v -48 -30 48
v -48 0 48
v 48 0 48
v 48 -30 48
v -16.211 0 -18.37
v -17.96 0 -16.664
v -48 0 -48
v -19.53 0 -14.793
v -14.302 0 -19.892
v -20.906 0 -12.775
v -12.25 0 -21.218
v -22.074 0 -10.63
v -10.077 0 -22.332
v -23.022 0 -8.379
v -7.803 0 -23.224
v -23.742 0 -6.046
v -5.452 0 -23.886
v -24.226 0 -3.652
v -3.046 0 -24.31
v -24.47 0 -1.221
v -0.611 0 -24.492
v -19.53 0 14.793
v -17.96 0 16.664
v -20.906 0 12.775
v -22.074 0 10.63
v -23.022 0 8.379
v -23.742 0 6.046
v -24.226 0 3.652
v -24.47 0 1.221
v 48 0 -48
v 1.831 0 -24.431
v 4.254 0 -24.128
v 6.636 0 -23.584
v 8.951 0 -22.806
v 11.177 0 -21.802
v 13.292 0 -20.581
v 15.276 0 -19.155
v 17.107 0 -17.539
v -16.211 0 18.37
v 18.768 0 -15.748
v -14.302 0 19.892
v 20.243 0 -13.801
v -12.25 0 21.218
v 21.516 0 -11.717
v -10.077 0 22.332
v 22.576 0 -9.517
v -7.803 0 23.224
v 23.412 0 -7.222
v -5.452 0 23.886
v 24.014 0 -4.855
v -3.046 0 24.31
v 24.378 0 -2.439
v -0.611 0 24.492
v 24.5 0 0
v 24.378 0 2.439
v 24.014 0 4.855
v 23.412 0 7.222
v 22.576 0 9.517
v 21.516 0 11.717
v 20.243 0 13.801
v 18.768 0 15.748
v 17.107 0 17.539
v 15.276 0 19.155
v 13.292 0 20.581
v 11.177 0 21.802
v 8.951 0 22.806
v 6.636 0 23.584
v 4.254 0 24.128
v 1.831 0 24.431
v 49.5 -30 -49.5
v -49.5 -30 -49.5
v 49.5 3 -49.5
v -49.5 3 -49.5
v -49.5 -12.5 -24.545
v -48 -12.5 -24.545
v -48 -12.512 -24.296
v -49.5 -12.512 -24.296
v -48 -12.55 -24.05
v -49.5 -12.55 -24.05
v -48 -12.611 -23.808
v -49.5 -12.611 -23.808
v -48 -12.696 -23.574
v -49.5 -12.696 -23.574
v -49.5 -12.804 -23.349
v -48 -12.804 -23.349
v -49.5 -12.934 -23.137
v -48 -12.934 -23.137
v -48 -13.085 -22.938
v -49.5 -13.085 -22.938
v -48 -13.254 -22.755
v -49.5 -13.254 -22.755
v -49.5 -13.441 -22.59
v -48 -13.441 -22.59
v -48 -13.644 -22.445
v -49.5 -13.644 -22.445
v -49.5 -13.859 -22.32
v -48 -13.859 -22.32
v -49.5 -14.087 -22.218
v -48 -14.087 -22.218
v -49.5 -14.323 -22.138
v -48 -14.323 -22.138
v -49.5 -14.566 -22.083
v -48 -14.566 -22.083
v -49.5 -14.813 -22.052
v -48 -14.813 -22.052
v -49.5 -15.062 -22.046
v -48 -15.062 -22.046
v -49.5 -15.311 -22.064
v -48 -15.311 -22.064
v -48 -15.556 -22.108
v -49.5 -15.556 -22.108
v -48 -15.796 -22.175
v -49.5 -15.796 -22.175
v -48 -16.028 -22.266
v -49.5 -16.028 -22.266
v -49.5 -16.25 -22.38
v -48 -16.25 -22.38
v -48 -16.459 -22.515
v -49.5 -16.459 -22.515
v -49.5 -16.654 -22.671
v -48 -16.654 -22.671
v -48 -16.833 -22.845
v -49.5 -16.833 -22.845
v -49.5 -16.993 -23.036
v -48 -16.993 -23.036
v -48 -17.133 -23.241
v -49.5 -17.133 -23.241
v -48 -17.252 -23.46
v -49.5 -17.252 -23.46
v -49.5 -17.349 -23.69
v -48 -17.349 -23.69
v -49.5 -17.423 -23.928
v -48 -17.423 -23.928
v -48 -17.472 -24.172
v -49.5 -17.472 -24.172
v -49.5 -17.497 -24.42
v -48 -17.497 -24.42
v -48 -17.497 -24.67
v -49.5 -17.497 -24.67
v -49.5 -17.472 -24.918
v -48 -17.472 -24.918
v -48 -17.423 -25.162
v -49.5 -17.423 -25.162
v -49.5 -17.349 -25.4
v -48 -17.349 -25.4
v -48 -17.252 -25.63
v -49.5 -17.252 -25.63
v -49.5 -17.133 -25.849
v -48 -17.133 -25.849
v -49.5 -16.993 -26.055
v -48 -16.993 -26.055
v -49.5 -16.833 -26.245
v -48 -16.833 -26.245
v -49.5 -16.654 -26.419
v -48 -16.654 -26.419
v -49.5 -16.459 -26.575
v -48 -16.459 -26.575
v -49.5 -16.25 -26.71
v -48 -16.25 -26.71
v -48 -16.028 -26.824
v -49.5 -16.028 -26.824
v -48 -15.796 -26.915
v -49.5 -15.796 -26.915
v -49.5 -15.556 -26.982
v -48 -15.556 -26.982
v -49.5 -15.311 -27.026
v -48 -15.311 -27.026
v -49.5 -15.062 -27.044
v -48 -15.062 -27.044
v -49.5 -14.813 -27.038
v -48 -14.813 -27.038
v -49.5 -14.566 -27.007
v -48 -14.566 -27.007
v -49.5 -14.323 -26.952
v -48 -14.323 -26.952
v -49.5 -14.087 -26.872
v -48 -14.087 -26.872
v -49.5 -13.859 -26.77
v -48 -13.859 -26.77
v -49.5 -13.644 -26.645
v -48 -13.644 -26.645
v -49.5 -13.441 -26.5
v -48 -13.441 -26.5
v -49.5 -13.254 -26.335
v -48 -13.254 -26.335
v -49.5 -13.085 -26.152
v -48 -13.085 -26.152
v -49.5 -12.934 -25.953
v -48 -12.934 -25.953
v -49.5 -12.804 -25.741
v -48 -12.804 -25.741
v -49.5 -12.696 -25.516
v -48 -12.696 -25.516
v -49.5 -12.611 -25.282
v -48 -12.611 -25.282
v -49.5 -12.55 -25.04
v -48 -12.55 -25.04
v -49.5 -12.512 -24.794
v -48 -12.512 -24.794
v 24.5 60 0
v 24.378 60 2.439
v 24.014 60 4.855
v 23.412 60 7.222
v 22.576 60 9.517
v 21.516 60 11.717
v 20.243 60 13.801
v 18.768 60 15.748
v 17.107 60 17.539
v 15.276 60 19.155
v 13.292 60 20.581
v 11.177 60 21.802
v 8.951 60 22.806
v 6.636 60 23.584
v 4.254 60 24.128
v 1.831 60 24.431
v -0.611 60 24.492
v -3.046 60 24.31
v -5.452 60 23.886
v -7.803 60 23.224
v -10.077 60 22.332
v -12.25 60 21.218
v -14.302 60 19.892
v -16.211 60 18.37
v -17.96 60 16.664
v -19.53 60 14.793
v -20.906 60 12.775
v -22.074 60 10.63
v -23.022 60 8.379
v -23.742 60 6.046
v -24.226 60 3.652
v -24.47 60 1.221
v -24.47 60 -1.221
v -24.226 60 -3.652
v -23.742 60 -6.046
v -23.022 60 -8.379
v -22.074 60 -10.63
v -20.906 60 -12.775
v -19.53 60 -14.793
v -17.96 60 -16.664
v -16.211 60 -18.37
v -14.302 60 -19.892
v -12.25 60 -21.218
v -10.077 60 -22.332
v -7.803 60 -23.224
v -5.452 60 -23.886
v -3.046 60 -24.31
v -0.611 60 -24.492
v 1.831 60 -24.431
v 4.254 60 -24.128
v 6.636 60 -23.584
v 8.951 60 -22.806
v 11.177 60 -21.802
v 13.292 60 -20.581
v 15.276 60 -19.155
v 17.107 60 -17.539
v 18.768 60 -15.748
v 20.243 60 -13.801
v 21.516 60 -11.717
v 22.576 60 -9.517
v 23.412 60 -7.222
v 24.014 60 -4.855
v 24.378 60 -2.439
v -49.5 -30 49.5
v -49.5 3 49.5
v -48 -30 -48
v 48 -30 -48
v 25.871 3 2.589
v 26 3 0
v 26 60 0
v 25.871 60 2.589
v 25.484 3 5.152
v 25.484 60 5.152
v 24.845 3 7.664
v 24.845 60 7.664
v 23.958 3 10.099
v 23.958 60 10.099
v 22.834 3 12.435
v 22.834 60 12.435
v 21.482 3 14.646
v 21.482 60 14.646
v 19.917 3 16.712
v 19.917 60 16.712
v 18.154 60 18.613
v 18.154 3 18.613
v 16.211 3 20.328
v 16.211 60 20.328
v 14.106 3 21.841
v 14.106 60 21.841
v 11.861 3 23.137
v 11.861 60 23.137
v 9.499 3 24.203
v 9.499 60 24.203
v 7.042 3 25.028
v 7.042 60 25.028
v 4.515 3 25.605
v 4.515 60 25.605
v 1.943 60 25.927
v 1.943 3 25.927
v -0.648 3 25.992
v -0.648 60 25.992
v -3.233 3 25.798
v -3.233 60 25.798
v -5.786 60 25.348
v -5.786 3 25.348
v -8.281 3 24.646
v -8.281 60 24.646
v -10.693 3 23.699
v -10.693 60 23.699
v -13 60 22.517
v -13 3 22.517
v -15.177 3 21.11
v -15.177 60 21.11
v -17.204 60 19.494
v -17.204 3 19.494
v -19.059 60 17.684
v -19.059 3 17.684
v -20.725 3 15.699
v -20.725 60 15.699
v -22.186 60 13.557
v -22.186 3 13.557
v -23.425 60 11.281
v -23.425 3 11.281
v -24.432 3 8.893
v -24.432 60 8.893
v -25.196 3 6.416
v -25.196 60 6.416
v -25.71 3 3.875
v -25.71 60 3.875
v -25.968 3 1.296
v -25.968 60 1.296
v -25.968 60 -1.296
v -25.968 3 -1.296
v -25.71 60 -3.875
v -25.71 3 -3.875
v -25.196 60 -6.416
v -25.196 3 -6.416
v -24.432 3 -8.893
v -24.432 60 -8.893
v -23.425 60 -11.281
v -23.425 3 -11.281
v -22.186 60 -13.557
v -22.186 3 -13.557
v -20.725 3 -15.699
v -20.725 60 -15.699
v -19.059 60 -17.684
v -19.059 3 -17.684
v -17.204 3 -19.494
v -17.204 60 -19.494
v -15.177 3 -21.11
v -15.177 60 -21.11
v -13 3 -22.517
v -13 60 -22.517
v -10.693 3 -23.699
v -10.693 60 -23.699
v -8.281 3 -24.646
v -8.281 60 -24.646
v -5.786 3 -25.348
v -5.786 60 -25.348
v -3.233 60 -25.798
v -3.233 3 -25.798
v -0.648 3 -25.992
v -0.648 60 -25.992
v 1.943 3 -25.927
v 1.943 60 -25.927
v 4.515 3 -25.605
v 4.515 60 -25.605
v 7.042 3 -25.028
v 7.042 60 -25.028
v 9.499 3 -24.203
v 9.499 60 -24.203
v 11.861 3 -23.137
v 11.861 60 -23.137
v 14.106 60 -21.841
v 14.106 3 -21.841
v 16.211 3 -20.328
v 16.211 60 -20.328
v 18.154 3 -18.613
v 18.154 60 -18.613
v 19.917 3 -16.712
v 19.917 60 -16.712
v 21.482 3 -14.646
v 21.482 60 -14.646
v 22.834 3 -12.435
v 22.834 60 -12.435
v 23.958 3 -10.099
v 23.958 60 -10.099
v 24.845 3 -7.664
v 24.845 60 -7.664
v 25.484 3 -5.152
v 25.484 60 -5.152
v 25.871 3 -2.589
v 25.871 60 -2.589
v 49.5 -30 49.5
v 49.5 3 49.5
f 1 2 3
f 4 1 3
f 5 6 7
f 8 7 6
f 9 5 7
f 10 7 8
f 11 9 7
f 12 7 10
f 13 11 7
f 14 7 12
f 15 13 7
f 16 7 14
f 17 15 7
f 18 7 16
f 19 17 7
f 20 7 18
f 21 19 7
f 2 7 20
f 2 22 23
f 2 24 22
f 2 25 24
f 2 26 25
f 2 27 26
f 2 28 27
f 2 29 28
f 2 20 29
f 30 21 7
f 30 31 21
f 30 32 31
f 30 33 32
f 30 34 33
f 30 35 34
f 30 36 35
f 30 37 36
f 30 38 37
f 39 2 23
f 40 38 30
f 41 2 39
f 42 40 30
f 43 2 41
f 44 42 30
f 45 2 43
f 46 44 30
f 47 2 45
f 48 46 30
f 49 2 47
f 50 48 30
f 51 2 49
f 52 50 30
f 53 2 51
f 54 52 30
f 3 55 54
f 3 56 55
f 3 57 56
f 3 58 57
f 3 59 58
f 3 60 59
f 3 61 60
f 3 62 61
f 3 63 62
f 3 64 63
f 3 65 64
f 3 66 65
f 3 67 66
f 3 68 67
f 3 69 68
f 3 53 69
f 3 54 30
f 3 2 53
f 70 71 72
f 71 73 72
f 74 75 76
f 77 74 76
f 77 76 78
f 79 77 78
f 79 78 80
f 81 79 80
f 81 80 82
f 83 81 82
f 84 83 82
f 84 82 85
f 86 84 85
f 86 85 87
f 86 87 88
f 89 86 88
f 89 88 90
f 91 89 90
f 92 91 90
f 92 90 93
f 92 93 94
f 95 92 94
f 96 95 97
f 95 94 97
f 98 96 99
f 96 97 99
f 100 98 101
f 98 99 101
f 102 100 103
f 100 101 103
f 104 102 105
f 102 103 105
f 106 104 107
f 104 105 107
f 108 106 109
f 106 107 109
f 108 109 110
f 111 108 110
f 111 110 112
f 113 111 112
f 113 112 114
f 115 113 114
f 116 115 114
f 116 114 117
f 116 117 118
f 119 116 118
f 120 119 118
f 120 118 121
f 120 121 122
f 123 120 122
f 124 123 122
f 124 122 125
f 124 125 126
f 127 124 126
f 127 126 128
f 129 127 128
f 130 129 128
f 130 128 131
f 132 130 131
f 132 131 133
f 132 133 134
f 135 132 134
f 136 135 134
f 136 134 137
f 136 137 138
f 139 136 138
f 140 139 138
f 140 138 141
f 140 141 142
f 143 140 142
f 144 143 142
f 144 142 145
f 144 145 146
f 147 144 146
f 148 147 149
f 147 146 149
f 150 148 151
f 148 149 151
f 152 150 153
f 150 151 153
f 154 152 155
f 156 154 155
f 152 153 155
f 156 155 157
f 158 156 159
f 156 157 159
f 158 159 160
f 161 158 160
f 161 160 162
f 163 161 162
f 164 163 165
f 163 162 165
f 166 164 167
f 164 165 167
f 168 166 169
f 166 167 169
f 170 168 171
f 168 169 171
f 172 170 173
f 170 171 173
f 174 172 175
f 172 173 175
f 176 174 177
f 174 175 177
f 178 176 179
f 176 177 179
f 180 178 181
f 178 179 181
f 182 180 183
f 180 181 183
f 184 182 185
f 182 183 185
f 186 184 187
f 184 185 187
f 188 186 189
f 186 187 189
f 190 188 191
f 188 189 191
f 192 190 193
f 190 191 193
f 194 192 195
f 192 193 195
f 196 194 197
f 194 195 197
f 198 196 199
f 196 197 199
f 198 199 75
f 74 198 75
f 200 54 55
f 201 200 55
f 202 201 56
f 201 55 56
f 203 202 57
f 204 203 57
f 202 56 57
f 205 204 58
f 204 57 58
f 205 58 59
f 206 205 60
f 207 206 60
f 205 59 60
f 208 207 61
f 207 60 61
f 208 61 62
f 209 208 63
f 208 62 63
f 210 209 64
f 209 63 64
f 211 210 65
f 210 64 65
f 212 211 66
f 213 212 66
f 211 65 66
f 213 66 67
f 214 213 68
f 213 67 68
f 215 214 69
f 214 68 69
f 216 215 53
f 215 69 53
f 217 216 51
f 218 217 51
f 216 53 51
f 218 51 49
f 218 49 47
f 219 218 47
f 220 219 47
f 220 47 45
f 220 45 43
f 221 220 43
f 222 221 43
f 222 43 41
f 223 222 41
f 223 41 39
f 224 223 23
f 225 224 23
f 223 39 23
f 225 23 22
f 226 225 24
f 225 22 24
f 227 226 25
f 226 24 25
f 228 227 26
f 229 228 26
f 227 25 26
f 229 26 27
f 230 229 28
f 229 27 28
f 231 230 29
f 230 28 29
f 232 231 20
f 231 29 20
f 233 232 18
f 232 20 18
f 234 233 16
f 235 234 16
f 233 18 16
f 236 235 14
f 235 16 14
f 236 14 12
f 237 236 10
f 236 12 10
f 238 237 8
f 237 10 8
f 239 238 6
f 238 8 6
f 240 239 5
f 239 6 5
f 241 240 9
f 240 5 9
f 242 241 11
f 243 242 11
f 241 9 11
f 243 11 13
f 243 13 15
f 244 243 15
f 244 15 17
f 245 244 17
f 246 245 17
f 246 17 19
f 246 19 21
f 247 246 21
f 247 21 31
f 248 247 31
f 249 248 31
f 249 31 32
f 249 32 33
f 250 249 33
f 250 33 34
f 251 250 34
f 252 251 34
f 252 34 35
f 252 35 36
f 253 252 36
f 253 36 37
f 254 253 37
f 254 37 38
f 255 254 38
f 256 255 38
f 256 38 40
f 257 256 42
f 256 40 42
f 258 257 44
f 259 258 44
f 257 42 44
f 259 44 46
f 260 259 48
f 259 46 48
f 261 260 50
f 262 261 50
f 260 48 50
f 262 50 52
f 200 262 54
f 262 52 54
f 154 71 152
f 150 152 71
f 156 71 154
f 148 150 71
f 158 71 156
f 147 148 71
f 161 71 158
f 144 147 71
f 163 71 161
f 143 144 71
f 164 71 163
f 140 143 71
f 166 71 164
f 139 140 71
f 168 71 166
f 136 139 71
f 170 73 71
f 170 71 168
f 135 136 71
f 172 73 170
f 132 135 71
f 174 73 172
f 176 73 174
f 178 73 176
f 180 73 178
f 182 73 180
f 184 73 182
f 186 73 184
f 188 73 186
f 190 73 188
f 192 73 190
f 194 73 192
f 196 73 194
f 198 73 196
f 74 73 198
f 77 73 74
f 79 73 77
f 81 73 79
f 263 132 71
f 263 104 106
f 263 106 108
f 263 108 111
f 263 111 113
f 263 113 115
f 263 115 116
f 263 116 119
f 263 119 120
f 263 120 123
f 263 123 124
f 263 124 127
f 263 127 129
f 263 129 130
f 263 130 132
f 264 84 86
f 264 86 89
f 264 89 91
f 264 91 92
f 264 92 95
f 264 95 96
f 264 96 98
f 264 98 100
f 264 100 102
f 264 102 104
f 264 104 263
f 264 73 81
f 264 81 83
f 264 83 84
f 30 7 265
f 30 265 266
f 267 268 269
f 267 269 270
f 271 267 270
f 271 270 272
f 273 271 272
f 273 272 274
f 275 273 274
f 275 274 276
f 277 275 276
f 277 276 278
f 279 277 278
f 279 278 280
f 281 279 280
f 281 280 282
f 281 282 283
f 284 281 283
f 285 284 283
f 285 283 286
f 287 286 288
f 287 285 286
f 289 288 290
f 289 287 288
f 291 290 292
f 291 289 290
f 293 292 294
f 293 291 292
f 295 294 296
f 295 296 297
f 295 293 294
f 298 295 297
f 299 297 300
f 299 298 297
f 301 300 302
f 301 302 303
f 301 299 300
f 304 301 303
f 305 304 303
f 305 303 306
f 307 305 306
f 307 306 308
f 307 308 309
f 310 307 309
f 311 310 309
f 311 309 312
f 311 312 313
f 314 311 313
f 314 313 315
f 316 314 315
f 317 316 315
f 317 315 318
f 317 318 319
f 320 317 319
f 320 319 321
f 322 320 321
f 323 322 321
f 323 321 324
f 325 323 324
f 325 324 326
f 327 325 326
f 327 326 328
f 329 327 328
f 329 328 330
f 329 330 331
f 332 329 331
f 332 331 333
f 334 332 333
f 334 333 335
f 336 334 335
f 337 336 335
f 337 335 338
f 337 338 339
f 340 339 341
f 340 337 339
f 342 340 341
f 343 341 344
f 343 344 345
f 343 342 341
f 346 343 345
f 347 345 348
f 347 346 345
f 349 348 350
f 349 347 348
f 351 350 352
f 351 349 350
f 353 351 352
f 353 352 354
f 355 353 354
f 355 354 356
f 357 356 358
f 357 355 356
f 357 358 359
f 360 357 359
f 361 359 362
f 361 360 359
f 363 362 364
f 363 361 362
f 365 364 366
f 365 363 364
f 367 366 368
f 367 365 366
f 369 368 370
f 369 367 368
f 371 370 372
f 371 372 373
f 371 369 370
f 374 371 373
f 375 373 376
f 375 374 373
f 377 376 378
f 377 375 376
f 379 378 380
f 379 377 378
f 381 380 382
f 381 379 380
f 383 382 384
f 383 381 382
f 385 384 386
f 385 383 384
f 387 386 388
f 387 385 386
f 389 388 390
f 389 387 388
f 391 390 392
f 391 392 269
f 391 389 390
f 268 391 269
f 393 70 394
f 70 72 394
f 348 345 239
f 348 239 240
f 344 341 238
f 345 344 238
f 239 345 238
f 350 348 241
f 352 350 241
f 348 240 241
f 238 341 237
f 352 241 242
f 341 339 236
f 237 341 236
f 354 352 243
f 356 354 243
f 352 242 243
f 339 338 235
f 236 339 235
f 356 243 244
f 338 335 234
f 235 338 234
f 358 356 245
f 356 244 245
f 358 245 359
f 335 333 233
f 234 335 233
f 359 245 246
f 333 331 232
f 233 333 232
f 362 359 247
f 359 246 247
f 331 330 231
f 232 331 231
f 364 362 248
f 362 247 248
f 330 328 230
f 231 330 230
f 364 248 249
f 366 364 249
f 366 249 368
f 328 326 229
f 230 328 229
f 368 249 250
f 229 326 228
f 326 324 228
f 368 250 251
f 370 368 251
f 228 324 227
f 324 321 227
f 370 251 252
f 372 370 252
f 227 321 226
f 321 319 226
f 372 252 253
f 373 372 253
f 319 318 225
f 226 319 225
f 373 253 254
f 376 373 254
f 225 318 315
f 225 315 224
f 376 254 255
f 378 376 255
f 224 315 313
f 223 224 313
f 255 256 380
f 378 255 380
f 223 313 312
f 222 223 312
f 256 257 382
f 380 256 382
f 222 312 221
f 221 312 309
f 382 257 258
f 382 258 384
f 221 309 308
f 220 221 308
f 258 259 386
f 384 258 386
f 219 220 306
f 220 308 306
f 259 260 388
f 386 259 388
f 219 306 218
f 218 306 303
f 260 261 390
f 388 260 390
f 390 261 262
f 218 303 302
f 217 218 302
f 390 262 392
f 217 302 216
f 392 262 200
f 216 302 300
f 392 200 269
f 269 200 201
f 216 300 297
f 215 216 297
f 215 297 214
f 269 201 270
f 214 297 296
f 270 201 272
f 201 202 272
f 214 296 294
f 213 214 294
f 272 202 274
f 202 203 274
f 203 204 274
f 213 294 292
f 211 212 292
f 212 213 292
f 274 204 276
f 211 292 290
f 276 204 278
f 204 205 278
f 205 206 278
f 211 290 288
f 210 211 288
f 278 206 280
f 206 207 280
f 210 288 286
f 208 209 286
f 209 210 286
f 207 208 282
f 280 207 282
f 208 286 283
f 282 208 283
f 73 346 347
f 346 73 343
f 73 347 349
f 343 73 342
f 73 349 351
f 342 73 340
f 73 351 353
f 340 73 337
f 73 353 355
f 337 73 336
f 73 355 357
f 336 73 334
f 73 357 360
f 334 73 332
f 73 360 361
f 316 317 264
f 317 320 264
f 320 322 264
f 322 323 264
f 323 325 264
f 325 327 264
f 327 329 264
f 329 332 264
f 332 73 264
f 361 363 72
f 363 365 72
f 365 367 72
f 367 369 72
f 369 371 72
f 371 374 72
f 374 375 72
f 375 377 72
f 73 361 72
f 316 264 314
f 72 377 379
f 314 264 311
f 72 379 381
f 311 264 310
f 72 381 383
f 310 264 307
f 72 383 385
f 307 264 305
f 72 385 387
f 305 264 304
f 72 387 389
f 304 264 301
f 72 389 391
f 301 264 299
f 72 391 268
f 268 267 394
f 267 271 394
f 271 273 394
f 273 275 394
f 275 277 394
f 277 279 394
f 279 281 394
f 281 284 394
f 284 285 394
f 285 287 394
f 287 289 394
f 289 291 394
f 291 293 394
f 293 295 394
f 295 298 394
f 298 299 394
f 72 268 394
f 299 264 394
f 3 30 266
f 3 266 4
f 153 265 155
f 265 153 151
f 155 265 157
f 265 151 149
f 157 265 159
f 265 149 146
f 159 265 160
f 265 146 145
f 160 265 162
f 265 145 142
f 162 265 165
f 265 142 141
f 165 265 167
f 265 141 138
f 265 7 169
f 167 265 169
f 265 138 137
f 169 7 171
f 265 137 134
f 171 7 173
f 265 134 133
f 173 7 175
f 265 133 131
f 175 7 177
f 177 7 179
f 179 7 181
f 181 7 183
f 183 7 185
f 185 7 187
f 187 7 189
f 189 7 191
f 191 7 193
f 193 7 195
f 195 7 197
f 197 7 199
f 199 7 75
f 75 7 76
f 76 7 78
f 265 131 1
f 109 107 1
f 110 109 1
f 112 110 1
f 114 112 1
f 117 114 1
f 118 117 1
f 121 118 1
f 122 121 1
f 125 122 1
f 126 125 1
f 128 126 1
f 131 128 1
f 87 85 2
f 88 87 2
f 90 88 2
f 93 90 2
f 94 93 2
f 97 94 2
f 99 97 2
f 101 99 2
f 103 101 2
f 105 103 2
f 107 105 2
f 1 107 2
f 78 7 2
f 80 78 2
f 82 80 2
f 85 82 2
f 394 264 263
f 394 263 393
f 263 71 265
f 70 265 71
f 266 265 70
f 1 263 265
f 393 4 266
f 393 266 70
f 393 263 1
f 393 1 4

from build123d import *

# Parameters (mm, degrees)
F0_W     = 99
F0_H     = 99
F1_DEPTH = 3
F2_R     = 26
F2_R_2   = 23
F3_DEPTH = 4
F4_R     = 26
F4_R_2   = 24.5
F5_DEPTH = 60
F6_W     = 99
F6_H     = 99
F6_W_2   = 96
F6_H_2   = 96
F7_DEPTH = 30
F8_R     = 2.5
F9_DEPTH = 25


with BuildPart() as f1:
    # F0 (on Front) → F1 (new body)
    with BuildSketch(Plane.XZ):
        Rectangle(F0_W, F0_H)
    extrude(amount=-F1_DEPTH)

    # F2 (on Front) → F3 (cut)
    with BuildSketch(Plane.XZ):
        Circle(F2_R)
        Circle(F2_R_2, mode=Mode.SUBTRACT)
        Circle(F2_R_2)
    extrude(amount=-F3_DEPTH, mode=Mode.SUBTRACT)

    # F4 (on face) → F5 (join)
    with BuildSketch(Plane.XZ):
        Circle(F4_R)
        Circle(F4_R_2, mode=Mode.SUBTRACT)
    extrude(amount=-F5_DEPTH)

    # F6 (on Front) → F7 (join)
    with BuildSketch(Plane.XZ):
        Rectangle(F6_W, F6_H)
        Rectangle(F6_W_2, F6_H_2, mode=Mode.SUBTRACT)
    extrude(amount=F7_DEPTH)

    # F8 (on face) → F9 (cut)
    with BuildSketch(Plane.YZ.offset(-48)):
        with Locations((-15, -24.5450405731)):
            Circle(F8_R)
    extrude(amount=-F9_DEPTH, mode=Mode.SUBTRACT)


solid = f1.part
